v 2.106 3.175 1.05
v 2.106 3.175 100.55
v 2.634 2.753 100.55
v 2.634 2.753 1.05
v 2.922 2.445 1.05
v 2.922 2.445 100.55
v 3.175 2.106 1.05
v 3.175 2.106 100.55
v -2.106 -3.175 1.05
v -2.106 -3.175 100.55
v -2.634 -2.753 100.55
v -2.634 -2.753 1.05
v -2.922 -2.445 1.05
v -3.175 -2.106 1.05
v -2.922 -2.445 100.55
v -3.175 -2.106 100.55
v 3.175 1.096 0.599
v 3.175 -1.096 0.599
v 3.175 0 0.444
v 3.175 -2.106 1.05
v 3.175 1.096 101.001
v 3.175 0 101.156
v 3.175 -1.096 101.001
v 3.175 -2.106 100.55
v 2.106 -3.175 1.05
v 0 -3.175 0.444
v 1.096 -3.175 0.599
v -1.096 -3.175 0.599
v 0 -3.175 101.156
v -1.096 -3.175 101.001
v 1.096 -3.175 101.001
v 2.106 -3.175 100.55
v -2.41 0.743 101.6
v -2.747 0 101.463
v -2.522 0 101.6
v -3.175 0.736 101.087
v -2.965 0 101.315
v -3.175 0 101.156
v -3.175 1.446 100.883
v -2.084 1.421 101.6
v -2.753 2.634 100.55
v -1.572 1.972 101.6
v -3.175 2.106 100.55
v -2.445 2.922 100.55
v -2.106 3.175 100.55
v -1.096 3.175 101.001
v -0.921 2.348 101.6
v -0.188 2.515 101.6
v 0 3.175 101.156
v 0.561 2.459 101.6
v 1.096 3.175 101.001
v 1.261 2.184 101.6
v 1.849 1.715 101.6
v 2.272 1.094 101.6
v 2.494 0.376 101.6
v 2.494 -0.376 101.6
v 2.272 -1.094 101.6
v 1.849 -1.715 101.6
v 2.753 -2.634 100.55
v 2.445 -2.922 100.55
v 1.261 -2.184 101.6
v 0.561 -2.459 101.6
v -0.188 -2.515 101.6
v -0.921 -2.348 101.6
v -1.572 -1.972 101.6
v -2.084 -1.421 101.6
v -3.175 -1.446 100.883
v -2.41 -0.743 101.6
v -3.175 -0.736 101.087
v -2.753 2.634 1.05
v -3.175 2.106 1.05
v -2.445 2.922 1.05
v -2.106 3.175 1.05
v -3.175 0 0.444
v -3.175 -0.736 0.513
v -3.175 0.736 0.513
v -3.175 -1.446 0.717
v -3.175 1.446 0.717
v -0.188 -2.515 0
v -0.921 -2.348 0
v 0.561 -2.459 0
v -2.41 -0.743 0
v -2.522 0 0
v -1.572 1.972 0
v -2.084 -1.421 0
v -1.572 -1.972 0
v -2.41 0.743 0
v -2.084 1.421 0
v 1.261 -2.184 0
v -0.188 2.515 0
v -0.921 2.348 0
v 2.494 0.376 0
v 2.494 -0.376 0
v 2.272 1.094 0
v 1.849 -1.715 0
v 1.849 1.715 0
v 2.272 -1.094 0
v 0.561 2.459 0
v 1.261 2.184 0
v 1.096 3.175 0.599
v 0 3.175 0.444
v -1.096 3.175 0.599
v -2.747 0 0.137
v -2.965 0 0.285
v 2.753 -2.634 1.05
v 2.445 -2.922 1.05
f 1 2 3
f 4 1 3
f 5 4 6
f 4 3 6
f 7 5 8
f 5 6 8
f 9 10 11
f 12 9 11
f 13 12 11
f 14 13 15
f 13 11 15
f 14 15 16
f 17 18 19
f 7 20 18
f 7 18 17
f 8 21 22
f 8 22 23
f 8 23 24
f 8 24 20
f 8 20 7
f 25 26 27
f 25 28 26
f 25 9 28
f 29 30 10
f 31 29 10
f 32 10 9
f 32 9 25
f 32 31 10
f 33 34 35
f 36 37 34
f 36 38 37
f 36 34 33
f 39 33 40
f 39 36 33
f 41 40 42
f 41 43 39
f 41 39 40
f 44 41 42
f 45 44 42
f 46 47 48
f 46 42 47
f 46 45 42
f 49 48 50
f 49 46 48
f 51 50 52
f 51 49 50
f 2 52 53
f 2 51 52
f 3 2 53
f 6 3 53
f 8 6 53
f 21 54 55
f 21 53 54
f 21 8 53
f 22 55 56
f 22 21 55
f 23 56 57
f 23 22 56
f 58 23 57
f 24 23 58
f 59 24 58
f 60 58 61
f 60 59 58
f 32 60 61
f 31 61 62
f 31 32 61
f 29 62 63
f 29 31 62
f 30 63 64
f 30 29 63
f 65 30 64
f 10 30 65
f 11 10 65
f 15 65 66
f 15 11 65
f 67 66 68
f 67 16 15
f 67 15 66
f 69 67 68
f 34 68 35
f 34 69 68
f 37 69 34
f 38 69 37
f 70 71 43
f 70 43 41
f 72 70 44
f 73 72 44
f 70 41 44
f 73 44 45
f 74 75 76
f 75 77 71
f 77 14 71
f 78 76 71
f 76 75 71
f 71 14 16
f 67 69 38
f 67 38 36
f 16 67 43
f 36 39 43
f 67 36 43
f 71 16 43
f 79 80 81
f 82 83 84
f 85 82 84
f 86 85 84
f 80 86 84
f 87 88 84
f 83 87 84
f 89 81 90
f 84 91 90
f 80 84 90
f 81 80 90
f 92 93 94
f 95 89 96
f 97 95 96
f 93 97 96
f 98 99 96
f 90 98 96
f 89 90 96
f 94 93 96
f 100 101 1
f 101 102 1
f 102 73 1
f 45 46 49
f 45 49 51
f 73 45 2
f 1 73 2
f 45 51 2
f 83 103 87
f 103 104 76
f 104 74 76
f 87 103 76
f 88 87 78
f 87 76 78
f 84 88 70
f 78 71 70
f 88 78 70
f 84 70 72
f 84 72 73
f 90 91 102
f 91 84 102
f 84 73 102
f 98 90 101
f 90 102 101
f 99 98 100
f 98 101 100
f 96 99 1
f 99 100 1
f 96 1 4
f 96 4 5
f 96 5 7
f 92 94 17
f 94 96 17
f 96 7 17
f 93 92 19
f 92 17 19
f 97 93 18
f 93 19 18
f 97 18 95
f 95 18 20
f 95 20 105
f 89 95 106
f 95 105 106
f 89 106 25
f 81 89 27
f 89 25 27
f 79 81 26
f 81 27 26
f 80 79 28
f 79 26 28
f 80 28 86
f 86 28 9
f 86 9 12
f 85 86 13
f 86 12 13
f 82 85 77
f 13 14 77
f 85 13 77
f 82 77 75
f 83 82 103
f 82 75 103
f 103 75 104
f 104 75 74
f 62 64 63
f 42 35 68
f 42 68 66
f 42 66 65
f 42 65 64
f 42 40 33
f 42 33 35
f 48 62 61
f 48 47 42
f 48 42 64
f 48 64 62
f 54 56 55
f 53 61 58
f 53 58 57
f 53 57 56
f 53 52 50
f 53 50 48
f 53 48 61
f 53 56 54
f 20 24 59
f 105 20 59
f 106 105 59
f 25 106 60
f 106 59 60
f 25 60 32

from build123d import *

# Parameters (mm, degrees)
SKETCH1_W           = 6.35
SKETCH1_H           = 6.35
BOSS_EXTRUDE1_DEPTH = 50.8
SKETCH2_OUTSIDE_W   = 18.668
SKETCH2_OUTSIDE_H   = 18.668
SKETCH2_OUTSIDE_R   = 3.81
CUT_EXTRUDE1_DEPTH  = 51.8


with BuildPart() as part:
    # Sketch1 → Boss-Extrude1 (new body)
    with BuildSketch(Plane.XY):
        Rectangle(SKETCH1_W, SKETCH1_H)
    extrude(amount=BOSS_EXTRUDE1_DEPTH)

    # Sketch2 outside → Cut-Extrude1 (cut, through all)
    with BuildSketch(Plane(origin=(0, 0, 0), x_dir=(-1, 0, 0), z_dir=(0, 0, -1))):
        Rectangle(SKETCH2_OUTSIDE_W, SKETCH2_OUTSIDE_H)
        Circle(SKETCH2_OUTSIDE_R, mode=Mode.SUBTRACT)
    extrude(amount=-CUT_EXTRUDE1_DEPTH, mode=Mode.SUBTRACT)

    # Sketch3 → Cut-Revolve1 (revolve, cut)
    with BuildSketch(Plane(origin=(0, 0, 0), x_dir=(1, 0, 0), z_dir=(0, 1, 0))):
        with BuildLine():
            Line((-5.053685963, -3.893335876), (-5.053685963, 5.740530545))
            Line((-5.053685963, 5.740530545), (0, 5.740530545))
            Line((0, 5.740530545), (0, 0.670274551))
            ThreePointArc((0, 0.670274551), (-3.404639553, -0.639469554), (-5.053685963, -3.893335876))
        make_face()
    revolve(axis=Axis((0, 0, 50.8), (0, 0, -1)), mode=Mode.SUBTRACT)

    # Mirror1: part across plane


with BuildPart() as part_1:
    add(part.part)
    add(part.part.mirror(Plane(origin=(0, 0, 50.8), x_dir=(1, 0, 0), z_dir=(0, 0, -1))))


solid = part_1.part
